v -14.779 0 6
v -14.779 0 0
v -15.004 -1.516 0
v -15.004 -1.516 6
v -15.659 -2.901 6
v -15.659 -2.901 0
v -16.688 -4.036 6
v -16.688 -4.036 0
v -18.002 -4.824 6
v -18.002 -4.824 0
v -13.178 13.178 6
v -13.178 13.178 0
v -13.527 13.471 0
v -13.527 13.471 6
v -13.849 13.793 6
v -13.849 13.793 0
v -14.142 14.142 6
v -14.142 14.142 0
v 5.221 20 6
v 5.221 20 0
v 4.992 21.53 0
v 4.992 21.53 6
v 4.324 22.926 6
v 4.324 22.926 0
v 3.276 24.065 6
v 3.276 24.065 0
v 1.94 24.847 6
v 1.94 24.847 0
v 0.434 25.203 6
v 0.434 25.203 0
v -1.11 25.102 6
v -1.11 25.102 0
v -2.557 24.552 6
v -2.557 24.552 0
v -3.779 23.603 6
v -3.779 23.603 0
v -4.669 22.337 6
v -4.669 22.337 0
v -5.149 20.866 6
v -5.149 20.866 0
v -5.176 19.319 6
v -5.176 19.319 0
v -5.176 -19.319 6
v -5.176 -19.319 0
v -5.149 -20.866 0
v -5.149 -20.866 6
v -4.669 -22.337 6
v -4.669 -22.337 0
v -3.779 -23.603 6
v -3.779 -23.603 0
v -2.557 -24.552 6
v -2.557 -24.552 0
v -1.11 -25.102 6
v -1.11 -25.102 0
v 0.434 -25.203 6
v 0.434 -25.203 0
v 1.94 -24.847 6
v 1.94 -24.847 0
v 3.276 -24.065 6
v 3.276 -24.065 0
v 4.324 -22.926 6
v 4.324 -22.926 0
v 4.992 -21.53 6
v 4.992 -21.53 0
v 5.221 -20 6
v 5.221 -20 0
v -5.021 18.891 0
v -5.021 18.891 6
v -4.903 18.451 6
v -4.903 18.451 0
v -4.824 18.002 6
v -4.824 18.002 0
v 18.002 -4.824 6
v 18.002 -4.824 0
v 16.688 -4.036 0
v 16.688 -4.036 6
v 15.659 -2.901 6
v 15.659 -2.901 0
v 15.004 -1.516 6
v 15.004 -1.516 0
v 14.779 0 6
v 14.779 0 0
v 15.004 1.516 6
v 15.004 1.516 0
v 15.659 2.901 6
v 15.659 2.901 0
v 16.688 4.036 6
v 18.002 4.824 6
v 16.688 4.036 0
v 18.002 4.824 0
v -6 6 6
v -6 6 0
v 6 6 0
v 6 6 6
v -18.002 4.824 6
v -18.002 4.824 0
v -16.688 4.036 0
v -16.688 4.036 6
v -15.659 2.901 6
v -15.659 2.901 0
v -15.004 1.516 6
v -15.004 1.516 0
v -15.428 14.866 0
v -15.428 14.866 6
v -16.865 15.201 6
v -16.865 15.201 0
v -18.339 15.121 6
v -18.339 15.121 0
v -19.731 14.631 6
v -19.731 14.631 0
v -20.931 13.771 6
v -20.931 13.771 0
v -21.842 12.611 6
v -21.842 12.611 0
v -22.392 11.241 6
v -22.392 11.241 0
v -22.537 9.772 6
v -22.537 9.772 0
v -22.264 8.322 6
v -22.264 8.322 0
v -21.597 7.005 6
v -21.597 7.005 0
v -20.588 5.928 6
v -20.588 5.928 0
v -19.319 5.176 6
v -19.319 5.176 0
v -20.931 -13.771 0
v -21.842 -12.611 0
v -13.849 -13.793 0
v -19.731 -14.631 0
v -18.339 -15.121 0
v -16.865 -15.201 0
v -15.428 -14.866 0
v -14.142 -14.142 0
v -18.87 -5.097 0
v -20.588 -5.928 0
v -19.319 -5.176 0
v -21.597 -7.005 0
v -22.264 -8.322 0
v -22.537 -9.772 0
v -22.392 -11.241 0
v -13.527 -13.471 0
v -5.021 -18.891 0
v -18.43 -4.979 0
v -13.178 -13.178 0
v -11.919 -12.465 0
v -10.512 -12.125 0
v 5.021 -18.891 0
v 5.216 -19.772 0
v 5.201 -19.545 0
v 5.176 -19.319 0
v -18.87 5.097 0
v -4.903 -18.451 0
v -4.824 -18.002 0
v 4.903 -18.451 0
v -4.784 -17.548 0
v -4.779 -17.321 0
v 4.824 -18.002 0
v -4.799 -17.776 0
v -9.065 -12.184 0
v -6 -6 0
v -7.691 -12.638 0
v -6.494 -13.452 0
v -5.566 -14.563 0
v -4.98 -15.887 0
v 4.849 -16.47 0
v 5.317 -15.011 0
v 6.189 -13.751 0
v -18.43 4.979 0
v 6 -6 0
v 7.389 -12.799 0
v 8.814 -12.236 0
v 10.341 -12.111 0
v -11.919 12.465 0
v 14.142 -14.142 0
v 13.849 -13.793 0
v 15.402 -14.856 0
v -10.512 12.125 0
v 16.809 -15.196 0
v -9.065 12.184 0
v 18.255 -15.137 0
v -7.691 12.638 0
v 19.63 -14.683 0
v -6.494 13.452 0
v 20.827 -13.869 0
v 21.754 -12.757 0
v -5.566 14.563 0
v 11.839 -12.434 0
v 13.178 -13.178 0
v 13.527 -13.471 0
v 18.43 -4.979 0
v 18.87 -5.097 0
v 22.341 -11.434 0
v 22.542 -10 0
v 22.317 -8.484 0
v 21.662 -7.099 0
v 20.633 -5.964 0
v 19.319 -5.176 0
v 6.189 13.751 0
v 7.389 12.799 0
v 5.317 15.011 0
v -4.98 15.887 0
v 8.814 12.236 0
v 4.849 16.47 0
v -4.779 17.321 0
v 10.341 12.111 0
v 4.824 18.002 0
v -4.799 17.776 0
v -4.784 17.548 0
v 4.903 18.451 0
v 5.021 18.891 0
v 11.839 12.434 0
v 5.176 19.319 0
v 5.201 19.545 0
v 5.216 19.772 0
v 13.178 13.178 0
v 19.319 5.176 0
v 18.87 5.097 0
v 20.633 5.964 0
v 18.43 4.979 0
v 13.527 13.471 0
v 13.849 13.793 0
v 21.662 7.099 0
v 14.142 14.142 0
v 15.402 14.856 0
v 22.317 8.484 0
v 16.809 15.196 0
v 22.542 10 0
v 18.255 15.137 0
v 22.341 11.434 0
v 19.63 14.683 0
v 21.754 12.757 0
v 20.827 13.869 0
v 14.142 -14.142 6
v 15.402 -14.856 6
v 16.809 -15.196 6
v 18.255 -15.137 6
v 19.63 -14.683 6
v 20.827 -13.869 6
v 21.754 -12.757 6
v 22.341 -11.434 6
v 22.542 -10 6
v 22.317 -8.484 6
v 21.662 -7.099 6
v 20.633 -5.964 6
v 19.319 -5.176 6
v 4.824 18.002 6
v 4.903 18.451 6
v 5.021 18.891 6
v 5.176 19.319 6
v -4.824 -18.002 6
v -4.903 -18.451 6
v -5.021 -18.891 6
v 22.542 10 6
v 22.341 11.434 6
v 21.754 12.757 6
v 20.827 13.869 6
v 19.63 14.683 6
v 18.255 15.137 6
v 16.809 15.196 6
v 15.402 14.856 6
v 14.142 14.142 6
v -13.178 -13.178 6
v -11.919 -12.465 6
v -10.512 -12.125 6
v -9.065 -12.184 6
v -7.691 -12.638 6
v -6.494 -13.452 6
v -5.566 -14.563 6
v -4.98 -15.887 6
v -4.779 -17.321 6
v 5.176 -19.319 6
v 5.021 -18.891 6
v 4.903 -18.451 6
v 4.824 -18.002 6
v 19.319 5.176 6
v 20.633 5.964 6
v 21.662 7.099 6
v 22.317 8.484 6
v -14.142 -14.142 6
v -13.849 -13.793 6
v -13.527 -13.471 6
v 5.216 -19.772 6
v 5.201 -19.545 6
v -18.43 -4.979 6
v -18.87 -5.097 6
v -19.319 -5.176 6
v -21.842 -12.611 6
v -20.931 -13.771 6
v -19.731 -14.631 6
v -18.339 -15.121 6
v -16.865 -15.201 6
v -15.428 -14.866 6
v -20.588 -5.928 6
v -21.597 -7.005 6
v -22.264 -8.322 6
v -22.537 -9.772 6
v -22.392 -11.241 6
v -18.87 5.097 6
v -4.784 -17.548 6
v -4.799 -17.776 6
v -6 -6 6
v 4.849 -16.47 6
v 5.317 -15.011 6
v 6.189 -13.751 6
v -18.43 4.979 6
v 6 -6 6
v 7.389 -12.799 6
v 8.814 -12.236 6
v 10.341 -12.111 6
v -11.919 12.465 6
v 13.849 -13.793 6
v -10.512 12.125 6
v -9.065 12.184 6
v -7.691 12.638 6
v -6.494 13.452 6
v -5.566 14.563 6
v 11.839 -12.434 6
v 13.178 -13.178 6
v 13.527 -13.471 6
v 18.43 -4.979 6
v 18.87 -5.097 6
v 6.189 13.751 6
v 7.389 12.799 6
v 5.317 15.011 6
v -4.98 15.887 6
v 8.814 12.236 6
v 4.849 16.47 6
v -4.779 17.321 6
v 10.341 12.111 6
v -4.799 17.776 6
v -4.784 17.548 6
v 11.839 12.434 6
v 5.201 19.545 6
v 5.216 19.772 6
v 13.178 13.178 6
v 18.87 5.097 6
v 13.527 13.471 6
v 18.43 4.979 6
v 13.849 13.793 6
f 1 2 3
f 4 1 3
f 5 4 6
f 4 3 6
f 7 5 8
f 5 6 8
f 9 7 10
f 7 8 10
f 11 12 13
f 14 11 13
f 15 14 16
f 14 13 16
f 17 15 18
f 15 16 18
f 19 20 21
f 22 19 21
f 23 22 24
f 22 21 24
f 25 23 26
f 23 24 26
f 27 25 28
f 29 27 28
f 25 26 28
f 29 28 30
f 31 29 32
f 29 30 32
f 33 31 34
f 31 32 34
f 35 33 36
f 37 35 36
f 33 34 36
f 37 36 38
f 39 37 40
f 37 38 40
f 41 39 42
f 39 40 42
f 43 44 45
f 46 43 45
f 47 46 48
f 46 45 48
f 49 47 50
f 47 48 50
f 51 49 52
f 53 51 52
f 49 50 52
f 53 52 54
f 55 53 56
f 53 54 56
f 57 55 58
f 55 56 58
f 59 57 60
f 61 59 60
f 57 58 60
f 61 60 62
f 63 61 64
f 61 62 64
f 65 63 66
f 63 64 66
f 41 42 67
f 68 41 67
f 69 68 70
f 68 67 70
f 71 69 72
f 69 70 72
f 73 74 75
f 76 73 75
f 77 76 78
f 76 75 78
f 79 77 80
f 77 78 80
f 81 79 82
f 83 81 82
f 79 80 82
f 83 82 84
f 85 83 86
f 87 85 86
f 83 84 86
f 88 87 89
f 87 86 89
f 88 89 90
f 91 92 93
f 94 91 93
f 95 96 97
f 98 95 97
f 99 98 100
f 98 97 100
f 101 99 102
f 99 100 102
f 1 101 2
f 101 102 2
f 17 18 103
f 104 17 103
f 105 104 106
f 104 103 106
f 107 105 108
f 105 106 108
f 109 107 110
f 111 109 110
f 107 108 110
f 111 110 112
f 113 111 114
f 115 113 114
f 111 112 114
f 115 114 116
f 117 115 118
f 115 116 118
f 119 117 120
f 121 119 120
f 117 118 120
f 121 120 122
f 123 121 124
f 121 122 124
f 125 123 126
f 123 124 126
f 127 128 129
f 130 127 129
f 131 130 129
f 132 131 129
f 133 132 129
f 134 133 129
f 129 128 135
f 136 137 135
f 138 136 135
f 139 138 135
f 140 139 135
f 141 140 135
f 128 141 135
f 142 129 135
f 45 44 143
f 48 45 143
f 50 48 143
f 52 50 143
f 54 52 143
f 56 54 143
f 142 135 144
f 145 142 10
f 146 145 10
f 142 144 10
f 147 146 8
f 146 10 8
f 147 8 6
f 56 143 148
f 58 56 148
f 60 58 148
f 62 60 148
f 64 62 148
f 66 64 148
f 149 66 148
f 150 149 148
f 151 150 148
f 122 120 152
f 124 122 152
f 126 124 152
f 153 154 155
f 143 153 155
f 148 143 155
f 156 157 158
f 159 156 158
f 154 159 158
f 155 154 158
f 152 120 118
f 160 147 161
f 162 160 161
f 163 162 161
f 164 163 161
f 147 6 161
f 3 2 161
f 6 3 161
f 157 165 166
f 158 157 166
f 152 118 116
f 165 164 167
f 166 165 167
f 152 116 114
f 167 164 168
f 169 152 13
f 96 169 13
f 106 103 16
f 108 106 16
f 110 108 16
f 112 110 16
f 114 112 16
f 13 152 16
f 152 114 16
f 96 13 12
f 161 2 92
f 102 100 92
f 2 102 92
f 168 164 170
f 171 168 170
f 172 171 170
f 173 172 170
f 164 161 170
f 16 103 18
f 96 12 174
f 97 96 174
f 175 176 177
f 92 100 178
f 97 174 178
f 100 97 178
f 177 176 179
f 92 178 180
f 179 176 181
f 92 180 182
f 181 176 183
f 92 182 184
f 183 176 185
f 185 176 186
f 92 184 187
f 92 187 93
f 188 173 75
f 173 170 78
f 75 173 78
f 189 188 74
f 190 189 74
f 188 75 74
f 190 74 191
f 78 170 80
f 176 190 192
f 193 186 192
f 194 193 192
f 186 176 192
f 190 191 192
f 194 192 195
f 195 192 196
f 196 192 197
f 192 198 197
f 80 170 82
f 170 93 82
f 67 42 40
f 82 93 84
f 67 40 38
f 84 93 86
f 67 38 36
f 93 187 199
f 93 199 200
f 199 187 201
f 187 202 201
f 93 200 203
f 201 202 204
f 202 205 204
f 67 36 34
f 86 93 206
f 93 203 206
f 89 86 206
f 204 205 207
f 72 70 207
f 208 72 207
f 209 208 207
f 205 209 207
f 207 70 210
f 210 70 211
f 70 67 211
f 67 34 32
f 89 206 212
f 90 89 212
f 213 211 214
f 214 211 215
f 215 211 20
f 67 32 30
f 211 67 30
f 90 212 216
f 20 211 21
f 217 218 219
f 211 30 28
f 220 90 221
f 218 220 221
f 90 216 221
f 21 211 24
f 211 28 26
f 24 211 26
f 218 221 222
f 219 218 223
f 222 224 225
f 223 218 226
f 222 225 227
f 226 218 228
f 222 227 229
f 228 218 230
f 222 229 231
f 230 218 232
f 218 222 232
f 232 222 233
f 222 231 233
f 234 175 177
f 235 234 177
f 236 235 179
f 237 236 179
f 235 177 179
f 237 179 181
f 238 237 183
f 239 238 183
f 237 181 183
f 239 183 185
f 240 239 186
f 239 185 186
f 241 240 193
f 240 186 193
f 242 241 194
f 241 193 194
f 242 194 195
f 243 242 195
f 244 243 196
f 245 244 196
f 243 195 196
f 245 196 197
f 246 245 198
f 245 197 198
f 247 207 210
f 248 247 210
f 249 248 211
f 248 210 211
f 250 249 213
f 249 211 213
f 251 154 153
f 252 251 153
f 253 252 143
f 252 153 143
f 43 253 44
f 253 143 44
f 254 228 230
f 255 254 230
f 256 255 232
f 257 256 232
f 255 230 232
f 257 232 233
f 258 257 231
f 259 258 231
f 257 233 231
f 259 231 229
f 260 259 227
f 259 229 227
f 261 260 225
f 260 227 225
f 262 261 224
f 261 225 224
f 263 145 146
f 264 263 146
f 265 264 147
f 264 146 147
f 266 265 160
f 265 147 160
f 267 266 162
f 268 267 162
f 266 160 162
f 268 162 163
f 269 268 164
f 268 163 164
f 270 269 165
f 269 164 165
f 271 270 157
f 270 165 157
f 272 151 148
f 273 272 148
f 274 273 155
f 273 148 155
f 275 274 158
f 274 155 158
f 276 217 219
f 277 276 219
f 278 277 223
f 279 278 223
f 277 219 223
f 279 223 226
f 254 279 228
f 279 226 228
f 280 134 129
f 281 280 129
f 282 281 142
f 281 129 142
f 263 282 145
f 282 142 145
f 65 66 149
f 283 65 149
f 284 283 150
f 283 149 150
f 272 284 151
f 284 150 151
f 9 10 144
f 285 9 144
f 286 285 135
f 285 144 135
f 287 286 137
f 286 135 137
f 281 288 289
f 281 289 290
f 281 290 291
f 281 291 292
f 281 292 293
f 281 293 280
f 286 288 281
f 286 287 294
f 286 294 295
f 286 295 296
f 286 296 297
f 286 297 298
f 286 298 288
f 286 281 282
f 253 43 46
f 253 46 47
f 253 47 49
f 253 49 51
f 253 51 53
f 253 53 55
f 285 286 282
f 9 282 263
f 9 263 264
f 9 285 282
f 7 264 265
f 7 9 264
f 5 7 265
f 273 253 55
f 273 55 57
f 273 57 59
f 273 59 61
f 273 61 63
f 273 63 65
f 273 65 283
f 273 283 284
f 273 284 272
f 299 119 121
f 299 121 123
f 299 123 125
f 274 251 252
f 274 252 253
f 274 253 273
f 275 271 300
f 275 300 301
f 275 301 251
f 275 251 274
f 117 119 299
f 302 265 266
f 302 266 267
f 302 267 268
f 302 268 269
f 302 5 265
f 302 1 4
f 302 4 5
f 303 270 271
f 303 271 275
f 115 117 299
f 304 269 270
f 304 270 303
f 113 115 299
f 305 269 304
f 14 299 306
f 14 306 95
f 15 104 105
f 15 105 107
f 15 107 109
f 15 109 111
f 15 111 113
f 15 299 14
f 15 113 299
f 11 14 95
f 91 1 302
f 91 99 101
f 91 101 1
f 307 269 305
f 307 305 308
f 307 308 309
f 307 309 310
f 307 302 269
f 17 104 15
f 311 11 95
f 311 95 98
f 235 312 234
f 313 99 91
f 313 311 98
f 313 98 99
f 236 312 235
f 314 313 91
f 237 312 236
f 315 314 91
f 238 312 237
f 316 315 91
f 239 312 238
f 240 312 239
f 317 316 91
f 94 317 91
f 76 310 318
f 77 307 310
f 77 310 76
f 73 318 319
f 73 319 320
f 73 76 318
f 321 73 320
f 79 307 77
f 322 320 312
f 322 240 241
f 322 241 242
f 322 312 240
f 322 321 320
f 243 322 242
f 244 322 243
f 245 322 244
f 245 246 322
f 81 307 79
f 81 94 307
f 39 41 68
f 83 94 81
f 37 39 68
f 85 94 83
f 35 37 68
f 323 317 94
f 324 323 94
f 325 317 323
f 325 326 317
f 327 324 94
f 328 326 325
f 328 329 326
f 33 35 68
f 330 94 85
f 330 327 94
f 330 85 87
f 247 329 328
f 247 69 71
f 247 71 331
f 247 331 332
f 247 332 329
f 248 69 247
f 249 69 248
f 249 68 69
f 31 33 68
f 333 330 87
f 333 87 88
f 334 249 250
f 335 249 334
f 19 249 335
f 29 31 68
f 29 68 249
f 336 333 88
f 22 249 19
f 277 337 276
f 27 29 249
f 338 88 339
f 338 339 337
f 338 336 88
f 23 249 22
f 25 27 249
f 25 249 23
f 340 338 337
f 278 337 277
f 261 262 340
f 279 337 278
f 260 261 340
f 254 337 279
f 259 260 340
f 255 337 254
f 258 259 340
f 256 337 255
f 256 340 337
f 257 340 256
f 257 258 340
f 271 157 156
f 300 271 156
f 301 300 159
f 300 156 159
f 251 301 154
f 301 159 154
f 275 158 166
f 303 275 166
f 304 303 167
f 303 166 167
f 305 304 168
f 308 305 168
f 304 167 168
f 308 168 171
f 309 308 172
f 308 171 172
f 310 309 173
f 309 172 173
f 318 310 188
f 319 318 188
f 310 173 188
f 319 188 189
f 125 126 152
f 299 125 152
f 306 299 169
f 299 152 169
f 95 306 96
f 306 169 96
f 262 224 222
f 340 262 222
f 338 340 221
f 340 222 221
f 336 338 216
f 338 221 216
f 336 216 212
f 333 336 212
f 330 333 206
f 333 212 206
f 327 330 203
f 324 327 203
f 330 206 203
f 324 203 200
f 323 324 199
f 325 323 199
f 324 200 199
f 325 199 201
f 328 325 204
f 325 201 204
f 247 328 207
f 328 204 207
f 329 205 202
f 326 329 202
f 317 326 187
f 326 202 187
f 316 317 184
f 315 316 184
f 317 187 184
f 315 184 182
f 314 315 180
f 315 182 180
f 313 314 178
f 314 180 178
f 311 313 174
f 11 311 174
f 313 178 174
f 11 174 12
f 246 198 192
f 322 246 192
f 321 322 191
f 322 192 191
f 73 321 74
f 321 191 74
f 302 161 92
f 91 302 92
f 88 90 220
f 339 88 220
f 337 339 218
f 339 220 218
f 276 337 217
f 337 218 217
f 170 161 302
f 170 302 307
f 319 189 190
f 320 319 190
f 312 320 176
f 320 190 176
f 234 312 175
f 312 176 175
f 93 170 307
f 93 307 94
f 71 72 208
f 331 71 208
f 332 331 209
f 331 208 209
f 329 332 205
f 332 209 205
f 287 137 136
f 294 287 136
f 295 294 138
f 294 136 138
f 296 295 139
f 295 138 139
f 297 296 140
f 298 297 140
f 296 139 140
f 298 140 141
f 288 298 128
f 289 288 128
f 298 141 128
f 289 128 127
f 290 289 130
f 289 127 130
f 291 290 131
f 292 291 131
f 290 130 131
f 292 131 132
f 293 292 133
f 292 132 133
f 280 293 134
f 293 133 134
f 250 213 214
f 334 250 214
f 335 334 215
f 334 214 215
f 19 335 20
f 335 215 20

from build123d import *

# Parameters (mm, degrees)
F0_W     = 12
F0_H     = 12
F1_DEPTH = 6


with BuildPart() as f1:
    # F0 (on Top) → F1 (new body)
    with BuildSketch(Plane.XY):
        with BuildLine():
            ThreePointArc((18.0019915499, 4.8236190979), (18.6486934227, 5.0431448029), (19.3185165258, 5.1763809021))
            ThreePointArc((19.3185165258, 5.1763809021), (17.3205080757, 10), (14.1421356237, 14.1421356237))
            ThreePointArc((14.1421356237, 14.1421356237), (13.6918382257, 13.62866985), (13.178372452, 13.178372452))
            ThreePointArc((13.178372452, 13.178372452), (12.7989481428, 7.3894761556), (18.0019915499, 4.8236190979))
        make_face()
        with BuildLine():
            ThreePointArc((14.1421356237, 14.1421356237), (17.3205080757, 10), (19.3185165258, 5.1763809021))
            ThreePointArc((19.3185165258, 5.1763809021), (21.6616505733, 7.0993413189), (22.5415557645, 10))
            ThreePointArc((22.5415557645, 10), (19.6297184195, 14.6826153543), (14.1421356237, 14.1421356237))
        make_face()
        with BuildLine():
            ThreePointArc((22.5415557645, -10), (21.6616505733, -7.0993413189), (19.3185165258, -5.1763809021))
            ThreePointArc((19.3185165258, -5.1763809021), (17.3205080757, -10), (14.1421356237, -14.1421356237))
            ThreePointArc((14.1421356237, -14.1421356237), (19.6297184195, -14.6826153543), (22.5415557645, -10))
        make_face()
        with BuildLine():
            ThreePointArc((14.1421356237, -14.1421356237), (17.3205080757, -10), (19.3185165258, -5.1763809021))
            ThreePointArc((19.3185165258, -5.1763809021), (18.6486934227, -5.0431448029), (18.0019915499, -4.8236190979))
            ThreePointArc((18.0019915499, -4.8236190979), (12.7989481428, -7.3894761556), (13.178372452, -13.178372452))
            ThreePointArc((13.178372452, -13.178372452), (13.6918382257, -13.62866985), (14.1421356237, -14.1421356237))
        make_face()
        with BuildLine():
            ThreePointArc((18.0019915499, -4.8236190979), (14.7789523112, 0), (18.0019915499, 4.8236190979))
            ThreePointArc((18.0019915499, 4.8236190979), (12.7989481428, 7.3894761556), (13.178372452, 13.178372452))
            ThreePointArc((13.178372452, 13.178372452), (7.3894761556, 12.7989481428), (4.8236190979, 18.0019915499))
            ThreePointArc((4.8236190979, 18.0019915499), (0, 14.7789523112), (-4.8236190979, 18.0019915499))
            ThreePointArc((-4.8236190979, 18.0019915499), (-4.7901309751, 17.6619809324), (-4.7789523112, 17.3205080757))
            ThreePointArc((-4.7789523112, 17.3205080757), (-7.6907896561, 12.6378927214), (-13.178372452, 13.178372452))
            ThreePointArc((-13.178372452, 13.178372452), (-12.3765407116, 11.6782507774), (-12.0994603869, 10))
            ThreePointArc((-12.0994603869, 10), (-13.8780321316, 6.0746085108), (-18.0019915499, 4.8236190979))
            ThreePointArc((-18.0019915499, 4.8236190979), (-15.6588575024, 2.9006586811), (-14.7789523112, 0))
            ThreePointArc((-14.7789523112, 0), (-15.6588575024, -2.9006586811), (-18.0019915499, -4.8236190979))
            ThreePointArc((-18.0019915499, -4.8236190979), (-13.8780321316, -6.0746085108), (-12.0994603869, -10))
            ThreePointArc((-12.0994603869, -10), (-12.3765407116, -11.6782507774), (-13.178372452, -13.178372452))
            ThreePointArc((-13.178372452, -13.178372452), (-7.6907896561, -12.6378927214), (-4.7789523112, -17.3205080757))
            ThreePointArc((-4.7789523112, -17.3205080757), (-4.7901309751, -17.6619809324), (-4.8236190979, -18.0019915499))
            ThreePointArc((-4.8236190979, -18.0019915499), (0, -14.7789523112), (4.8236190979, -18.0019915499))
            ThreePointArc((4.8236190979, -18.0019915499), (7.3894761556, -12.7989481428), (13.178372452, -13.178372452))
            ThreePointArc((13.178372452, -13.178372452), (12.7989481428, -7.3894761556), (18.0019915499, -4.8236190979))
        make_face()
        Rectangle(F0_W, F0_H, mode=Mode.SUBTRACT)
        with BuildLine():
            ThreePointArc((4.8236190979, 18.0019915499), (4.9568551971, 18.6718146529), (5.1763809021, 19.3185165258))
            ThreePointArc((5.1763809021, 19.3185165258), (0, 20), (-5.1763809021, 19.3185165258))
            ThreePointArc((-5.1763809021, 19.3185165258), (-4.9568551971, 18.6718146529), (-4.8236190979, 18.0019915499))
            ThreePointArc((-4.8236190979, 18.0019915499), (0, 14.7789523112), (4.8236190979, 18.0019915499))
        make_face()
        with BuildLine():
            ThreePointArc((-5.1763809021, 19.3185165258), (0, 20), (5.1763809021, 19.3185165258))
            ThreePointArc((5.1763809021, 19.3185165258), (5.2098690249, 19.6585271433), (5.2210476888, 20))
            ThreePointArc((5.2210476888, 20), (-0.3414728567, 25.2098690249), (-5.1763809021, 19.3185165258))
        make_face()
        with BuildLine():
            ThreePointArc((5.2210476888, -20), (5.2098690249, -19.6585271433), (5.1763809021, -19.3185165258))
            ThreePointArc((5.1763809021, -19.3185165258), (0, -20), (-5.1763809021, -19.3185165258))
            ThreePointArc((-5.1763809021, -19.3185165258), (-0.3414728567, -25.2098690249), (5.2210476888, -20))
        make_face()
        with BuildLine():
            ThreePointArc((-5.1763809021, -19.3185165258), (0, -20), (5.1763809021, -19.3185165258))
            ThreePointArc((5.1763809021, -19.3185165258), (4.9568551971, -18.6718146529), (4.8236190979, -18.0019915499))
            ThreePointArc((4.8236190979, -18.0019915499), (0, -14.7789523112), (-4.8236190979, -18.0019915499))
            ThreePointArc((-4.8236190979, -18.0019915499), (-4.9568551971, -18.6718146529), (-5.1763809021, -19.3185165258))
        make_face()
        with BuildLine():
            ThreePointArc((-13.178372452, 13.178372452), (-13.6918382257, 13.62866985), (-14.1421356237, 14.1421356237))
            ThreePointArc((-14.1421356237, 14.1421356237), (-17.3205080757, 10), (-19.3185165258, 5.1763809021))
            ThreePointArc((-19.3185165258, 5.1763809021), (-18.6486934227, 5.0431448029), (-18.0019915499, 4.8236190979))
            ThreePointArc((-18.0019915499, 4.8236190979), (-13.8780321316, 6.0746085108), (-12.0994603869, 10))
            ThreePointArc((-12.0994603869, 10), (-12.3765407116, 11.6782507774), (-13.178372452, 13.178372452))
        make_face()
        with BuildLine():
            ThreePointArc((-19.3185165258, 5.1763809021), (-17.3205080757, 10), (-14.1421356237, 14.1421356237))
            ThreePointArc((-14.1421356237, 14.1421356237), (-21.8420680086, 12.6105238444), (-19.3185165258, 5.1763809021))
        make_face()
        with BuildLine():
            ThreePointArc((-19.3185165258, -5.1763809021), (-21.8420680086, -12.6105238444), (-14.1421356237, -14.1421356237))
            ThreePointArc((-14.1421356237, -14.1421356237), (-17.3205080757, -10), (-19.3185165258, -5.1763809021))
        make_face()
        with BuildLine():
            ThreePointArc((-19.3185165258, -5.1763809021), (-17.3205080757, -10), (-14.1421356237, -14.1421356237))
            ThreePointArc((-14.1421356237, -14.1421356237), (-13.6918382257, -13.62866985), (-13.178372452, -13.178372452))
            ThreePointArc((-13.178372452, -13.178372452), (-12.3765407116, -11.6782507774), (-12.0994603869, -10))
            ThreePointArc((-12.0994603869, -10), (-13.8780321316, -6.0746085108), (-18.0019915499, -4.8236190979))
            ThreePointArc((-18.0019915499, -4.8236190979), (-18.6486934227, -5.0431448029), (-19.3185165258, -5.1763809021))
        make_face()
    extrude(amount=F1_DEPTH)


solid = f1.part
